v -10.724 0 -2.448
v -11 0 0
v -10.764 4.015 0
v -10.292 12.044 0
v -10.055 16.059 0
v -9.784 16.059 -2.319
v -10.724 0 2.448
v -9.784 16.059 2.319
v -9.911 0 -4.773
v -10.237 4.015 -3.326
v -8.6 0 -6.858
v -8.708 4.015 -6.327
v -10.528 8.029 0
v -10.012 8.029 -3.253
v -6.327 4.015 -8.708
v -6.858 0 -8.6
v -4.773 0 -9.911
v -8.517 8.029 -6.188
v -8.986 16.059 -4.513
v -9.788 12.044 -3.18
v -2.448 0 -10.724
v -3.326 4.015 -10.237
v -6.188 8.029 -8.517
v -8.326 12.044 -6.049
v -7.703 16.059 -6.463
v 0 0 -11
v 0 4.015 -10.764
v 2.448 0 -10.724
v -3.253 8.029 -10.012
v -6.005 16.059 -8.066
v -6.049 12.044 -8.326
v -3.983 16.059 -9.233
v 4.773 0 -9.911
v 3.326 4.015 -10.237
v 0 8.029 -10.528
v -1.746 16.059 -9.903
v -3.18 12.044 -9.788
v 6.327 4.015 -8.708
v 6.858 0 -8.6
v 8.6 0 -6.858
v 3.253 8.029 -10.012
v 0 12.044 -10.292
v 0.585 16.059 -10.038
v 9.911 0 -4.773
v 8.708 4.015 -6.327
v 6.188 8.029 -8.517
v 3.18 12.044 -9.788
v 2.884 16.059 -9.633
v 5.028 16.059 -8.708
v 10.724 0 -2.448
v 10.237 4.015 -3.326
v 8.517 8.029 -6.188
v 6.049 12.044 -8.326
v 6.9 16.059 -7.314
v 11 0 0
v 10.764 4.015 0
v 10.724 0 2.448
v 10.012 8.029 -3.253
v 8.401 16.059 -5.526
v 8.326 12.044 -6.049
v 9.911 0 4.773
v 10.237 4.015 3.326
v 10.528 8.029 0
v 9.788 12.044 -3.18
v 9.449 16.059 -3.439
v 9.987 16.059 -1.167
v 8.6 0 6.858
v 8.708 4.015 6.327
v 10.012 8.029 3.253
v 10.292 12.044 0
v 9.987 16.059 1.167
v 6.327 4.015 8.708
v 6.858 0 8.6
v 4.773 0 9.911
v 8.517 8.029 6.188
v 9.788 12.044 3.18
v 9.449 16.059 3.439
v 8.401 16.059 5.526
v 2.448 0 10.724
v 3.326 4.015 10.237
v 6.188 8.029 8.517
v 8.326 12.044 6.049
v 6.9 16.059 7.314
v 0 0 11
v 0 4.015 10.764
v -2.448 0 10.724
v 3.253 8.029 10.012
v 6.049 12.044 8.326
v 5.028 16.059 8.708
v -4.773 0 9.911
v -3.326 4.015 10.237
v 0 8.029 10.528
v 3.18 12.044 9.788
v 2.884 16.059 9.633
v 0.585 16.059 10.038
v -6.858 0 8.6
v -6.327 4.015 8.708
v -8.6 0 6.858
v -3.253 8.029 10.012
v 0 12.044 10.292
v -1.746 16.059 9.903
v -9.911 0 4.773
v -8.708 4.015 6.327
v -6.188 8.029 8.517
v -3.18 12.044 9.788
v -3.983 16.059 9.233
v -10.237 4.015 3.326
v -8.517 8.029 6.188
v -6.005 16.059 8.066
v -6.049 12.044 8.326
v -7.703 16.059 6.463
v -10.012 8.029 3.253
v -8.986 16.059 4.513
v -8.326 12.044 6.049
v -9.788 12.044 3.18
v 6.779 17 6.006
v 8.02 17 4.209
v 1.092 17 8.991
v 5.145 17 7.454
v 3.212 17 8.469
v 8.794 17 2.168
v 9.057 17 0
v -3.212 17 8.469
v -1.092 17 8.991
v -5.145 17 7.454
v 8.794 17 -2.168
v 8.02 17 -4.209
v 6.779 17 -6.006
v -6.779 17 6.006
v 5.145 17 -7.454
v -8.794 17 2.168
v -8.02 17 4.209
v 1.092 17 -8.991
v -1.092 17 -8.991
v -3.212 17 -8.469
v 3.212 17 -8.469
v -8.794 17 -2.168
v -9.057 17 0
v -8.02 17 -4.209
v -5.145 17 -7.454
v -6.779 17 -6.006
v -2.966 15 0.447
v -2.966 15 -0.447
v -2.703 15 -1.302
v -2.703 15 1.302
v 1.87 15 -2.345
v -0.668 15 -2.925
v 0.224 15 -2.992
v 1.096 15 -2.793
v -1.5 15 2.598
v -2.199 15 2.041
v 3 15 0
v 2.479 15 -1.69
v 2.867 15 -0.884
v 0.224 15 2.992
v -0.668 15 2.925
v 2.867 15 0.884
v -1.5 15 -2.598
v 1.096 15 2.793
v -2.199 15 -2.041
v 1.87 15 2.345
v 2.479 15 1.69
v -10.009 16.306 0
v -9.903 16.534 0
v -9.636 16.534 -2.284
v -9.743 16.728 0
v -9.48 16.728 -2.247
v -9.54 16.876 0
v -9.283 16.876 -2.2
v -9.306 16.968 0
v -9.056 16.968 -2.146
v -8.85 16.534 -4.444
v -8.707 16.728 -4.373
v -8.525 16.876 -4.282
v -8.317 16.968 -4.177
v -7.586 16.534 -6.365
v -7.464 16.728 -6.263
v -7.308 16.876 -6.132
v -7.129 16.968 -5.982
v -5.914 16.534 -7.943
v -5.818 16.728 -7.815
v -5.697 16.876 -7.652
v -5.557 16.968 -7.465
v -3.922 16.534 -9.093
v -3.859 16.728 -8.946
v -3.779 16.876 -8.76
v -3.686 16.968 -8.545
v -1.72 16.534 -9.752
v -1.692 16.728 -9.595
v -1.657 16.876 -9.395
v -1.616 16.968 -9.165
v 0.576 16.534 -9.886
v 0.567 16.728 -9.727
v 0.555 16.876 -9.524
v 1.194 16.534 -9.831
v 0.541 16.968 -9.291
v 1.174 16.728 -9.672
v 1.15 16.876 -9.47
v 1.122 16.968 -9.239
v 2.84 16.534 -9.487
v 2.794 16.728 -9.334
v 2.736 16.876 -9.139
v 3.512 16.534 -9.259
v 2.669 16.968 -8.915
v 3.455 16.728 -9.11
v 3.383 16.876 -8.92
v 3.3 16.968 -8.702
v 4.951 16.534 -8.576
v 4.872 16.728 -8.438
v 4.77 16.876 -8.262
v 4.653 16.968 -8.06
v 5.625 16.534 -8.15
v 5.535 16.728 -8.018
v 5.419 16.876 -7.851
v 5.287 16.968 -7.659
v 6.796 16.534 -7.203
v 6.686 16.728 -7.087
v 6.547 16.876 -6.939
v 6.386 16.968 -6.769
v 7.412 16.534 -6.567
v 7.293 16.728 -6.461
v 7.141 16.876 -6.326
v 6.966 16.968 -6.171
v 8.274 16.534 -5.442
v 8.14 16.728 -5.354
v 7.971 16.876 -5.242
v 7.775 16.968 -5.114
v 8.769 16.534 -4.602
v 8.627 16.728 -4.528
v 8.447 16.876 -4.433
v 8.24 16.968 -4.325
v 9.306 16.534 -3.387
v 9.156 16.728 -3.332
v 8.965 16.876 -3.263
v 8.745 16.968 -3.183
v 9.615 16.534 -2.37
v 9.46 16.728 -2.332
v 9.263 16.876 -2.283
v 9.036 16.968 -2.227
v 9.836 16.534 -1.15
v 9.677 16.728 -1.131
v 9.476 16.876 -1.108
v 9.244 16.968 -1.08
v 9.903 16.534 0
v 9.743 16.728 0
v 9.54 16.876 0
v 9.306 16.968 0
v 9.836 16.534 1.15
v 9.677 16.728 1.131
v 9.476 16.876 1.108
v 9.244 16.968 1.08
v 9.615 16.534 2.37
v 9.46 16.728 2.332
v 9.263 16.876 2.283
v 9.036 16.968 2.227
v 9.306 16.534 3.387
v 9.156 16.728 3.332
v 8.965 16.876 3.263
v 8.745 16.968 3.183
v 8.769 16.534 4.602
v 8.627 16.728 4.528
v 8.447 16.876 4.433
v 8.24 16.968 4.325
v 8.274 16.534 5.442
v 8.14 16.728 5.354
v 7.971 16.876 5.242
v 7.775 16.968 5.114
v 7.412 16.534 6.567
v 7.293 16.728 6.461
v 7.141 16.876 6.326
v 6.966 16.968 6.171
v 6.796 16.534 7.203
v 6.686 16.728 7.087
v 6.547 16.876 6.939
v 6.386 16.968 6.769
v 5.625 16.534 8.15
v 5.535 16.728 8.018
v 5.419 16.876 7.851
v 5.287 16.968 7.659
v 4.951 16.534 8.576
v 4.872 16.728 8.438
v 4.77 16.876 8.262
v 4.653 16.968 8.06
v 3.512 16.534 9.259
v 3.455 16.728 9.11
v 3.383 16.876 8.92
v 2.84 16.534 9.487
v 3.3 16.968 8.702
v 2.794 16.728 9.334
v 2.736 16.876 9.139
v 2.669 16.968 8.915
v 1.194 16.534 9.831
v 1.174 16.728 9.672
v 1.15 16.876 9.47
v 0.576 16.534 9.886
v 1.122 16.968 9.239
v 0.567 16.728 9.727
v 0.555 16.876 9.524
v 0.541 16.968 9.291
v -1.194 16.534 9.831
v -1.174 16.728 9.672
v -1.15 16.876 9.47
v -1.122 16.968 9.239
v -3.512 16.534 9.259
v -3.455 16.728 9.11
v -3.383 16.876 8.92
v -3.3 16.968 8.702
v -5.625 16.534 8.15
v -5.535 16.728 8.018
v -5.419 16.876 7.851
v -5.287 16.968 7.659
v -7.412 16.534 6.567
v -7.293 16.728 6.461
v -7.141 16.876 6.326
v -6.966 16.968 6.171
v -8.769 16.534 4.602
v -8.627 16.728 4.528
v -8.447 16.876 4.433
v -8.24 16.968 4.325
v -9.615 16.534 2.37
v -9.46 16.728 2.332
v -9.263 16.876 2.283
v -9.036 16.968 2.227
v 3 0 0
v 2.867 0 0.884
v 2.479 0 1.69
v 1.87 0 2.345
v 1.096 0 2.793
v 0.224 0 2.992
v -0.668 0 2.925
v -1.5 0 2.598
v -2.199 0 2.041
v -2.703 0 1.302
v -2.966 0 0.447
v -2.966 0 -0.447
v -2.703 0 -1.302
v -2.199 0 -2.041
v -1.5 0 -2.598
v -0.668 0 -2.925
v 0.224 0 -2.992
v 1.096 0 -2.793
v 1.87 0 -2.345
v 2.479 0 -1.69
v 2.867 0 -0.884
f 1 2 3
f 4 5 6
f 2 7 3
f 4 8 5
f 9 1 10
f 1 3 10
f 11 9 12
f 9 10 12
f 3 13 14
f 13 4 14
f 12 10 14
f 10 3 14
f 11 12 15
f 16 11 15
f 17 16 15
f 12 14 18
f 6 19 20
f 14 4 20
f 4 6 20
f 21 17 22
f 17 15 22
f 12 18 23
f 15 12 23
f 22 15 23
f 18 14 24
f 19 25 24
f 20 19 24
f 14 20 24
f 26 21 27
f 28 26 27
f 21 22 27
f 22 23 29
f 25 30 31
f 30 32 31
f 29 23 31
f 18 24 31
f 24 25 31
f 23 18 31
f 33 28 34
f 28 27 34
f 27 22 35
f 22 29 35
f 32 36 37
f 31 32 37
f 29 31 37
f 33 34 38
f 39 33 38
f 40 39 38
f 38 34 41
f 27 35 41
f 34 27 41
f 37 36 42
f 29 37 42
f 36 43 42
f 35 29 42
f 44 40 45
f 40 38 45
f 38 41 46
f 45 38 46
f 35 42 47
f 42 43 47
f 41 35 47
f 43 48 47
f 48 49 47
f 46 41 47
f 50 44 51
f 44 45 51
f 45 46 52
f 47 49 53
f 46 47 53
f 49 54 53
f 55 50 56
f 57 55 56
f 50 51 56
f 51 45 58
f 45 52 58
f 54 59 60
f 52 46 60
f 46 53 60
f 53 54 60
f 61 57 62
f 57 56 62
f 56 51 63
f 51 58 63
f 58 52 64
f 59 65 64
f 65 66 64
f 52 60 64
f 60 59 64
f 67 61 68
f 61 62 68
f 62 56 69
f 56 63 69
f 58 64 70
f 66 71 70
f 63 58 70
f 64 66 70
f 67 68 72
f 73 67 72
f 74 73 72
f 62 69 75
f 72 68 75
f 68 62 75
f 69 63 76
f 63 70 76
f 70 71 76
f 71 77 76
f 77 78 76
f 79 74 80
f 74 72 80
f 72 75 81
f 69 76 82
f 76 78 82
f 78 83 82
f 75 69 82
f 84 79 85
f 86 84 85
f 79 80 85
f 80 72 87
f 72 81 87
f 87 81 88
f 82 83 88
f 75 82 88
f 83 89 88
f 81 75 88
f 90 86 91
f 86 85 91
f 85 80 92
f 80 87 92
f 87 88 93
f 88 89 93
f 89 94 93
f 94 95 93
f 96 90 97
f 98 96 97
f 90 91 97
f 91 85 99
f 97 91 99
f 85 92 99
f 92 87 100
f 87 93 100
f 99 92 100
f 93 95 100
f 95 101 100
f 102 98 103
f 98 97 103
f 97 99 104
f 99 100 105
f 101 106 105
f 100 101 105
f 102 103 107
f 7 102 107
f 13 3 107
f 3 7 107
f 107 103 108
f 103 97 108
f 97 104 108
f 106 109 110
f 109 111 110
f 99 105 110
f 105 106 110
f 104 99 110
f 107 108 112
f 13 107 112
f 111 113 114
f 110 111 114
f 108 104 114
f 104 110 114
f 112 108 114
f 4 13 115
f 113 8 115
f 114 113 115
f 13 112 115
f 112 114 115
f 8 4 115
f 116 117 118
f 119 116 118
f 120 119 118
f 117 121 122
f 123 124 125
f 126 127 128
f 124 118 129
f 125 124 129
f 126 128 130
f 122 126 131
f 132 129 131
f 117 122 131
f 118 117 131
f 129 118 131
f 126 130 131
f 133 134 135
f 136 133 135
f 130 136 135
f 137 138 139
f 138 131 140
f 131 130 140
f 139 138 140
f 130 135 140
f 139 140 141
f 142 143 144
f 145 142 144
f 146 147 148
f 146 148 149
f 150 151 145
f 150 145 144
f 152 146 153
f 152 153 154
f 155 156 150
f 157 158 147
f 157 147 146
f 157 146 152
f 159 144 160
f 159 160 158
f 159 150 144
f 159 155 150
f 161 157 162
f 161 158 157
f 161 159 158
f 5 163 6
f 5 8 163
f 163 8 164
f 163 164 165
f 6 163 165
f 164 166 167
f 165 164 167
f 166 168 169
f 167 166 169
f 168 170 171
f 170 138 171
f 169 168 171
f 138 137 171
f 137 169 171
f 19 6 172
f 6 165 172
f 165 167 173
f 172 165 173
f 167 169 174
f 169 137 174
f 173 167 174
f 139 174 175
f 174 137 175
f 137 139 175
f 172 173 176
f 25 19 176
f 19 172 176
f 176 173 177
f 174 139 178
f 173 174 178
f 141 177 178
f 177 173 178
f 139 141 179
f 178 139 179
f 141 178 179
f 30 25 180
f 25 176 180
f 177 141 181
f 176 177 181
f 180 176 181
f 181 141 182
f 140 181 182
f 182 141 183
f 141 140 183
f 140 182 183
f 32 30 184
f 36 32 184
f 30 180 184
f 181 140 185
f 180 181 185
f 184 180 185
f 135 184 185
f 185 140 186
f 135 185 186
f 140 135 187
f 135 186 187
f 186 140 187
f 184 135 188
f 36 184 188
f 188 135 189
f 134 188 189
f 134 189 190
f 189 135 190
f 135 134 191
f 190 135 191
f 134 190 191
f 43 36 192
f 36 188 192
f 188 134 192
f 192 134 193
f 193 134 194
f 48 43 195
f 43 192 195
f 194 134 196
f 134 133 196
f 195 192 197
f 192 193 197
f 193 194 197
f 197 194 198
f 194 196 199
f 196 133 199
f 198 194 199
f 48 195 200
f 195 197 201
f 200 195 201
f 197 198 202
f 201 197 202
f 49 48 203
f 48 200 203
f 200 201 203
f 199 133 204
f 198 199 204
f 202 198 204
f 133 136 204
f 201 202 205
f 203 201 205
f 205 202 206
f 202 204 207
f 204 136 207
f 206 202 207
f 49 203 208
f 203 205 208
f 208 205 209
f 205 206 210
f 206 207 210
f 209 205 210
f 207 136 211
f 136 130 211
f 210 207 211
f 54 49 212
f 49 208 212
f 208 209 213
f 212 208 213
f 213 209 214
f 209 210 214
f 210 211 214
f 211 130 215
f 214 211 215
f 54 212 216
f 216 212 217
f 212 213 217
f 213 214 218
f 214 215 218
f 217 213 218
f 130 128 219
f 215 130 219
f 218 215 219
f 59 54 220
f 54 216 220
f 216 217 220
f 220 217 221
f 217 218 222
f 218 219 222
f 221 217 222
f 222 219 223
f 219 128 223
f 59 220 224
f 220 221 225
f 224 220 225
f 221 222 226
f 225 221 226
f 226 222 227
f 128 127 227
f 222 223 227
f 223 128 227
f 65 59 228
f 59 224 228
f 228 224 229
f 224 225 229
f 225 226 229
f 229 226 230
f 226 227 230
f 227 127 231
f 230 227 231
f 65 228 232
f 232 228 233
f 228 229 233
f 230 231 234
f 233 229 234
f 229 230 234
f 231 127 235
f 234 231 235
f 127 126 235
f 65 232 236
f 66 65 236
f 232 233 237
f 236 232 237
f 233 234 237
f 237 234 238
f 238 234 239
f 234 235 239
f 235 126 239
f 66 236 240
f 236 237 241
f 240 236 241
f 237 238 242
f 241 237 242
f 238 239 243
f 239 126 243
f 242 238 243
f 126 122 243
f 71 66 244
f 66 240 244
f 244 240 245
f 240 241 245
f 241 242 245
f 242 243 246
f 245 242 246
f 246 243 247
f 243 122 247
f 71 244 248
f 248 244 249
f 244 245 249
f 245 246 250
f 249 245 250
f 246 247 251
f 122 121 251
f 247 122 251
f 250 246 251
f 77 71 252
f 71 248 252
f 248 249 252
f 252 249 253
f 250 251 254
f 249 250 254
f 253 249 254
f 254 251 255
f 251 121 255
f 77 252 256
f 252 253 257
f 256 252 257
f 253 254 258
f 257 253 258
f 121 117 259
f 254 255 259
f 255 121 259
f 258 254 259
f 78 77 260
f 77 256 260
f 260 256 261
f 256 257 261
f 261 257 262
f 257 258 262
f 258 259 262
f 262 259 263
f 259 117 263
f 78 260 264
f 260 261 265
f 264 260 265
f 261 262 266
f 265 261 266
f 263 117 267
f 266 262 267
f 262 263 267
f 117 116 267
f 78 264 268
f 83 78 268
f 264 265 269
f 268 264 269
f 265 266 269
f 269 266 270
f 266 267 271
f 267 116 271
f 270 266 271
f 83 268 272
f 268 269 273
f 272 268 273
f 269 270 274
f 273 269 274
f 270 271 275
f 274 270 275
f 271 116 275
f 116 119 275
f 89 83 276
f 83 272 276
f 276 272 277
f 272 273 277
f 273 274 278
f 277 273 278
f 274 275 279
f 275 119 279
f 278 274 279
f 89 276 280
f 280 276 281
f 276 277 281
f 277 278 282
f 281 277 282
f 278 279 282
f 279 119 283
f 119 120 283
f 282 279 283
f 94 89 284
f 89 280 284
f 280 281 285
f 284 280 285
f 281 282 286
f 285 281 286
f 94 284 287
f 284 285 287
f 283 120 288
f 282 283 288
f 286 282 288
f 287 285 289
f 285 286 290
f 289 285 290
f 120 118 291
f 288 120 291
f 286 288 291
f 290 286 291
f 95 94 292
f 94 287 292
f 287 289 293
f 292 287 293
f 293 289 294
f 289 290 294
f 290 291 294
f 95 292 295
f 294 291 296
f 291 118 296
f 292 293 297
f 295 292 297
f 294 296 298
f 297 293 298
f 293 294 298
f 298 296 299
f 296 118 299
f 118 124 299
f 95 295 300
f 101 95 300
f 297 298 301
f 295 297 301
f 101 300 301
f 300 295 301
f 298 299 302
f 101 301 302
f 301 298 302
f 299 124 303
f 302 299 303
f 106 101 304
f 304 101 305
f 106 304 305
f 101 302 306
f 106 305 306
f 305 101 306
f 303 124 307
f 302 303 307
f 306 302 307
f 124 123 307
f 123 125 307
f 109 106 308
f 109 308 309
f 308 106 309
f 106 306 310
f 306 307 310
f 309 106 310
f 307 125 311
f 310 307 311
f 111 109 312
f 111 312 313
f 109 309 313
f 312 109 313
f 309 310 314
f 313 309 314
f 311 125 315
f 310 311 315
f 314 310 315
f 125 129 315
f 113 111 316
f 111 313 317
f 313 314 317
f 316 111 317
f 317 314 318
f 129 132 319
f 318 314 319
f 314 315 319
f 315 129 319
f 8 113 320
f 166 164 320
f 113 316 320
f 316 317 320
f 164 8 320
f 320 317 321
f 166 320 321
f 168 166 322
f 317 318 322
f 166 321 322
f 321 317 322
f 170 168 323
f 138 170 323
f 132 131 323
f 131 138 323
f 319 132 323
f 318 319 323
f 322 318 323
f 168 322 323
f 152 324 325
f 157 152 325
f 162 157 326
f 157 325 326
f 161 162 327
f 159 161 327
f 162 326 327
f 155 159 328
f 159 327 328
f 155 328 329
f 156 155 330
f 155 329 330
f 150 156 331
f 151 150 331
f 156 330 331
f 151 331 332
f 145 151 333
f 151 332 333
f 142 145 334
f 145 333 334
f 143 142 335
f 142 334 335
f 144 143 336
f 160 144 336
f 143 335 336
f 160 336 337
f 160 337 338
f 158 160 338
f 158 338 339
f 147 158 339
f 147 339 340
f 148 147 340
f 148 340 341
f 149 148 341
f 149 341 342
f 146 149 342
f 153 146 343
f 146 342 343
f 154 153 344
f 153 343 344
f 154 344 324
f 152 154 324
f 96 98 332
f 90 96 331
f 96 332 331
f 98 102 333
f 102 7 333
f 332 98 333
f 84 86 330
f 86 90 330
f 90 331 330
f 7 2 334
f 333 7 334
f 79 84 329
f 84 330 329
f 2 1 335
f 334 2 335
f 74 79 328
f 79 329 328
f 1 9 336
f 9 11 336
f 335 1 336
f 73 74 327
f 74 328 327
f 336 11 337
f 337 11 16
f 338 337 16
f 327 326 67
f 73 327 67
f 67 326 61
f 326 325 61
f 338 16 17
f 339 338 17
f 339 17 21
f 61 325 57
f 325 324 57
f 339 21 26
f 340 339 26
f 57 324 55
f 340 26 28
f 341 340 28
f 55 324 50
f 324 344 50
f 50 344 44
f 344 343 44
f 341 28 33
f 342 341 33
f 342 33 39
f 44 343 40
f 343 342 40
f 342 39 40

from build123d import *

# Parameters (mm, degrees)
SCHIZZO3_R               = 3
TAGLIO_ESTRUSIONE1_DEPTH = 15
RACCORDO1_R              = 1


with BuildPart() as part:
    # Schizzo2 → Rivoluzione1 (revolve)
    with BuildSketch(Plane.XY, mode=Mode.PRIVATE) as rivoluzione1_sk:
        Polygon((0, 0), (11, 0), (10, 17), (0, 17), align=None)
    revolve(rivoluzione1_sk.sketch.rotate(Axis((0, 17, 0), (0, -1, 0)), 180), axis=Axis((0, 17, 0), (0, -1, 0)))

    # Schizzo3 → Taglio-Estrusione1 (cut)
    with BuildSketch(Plane.XZ):
        Circle(SCHIZZO3_R)
    extrude(amount=-TAGLIO_ESTRUSIONE1_DEPTH, mode=Mode.SUBTRACT)

    # Raccordo1
    raccordo1_edges = [part.edges().sort_by_distance(p)[0] for p in [
        (10, 17, 0),
    ]]
    fillet(raccordo1_edges, radius=RACCORDO1_R)


solid = part.part
